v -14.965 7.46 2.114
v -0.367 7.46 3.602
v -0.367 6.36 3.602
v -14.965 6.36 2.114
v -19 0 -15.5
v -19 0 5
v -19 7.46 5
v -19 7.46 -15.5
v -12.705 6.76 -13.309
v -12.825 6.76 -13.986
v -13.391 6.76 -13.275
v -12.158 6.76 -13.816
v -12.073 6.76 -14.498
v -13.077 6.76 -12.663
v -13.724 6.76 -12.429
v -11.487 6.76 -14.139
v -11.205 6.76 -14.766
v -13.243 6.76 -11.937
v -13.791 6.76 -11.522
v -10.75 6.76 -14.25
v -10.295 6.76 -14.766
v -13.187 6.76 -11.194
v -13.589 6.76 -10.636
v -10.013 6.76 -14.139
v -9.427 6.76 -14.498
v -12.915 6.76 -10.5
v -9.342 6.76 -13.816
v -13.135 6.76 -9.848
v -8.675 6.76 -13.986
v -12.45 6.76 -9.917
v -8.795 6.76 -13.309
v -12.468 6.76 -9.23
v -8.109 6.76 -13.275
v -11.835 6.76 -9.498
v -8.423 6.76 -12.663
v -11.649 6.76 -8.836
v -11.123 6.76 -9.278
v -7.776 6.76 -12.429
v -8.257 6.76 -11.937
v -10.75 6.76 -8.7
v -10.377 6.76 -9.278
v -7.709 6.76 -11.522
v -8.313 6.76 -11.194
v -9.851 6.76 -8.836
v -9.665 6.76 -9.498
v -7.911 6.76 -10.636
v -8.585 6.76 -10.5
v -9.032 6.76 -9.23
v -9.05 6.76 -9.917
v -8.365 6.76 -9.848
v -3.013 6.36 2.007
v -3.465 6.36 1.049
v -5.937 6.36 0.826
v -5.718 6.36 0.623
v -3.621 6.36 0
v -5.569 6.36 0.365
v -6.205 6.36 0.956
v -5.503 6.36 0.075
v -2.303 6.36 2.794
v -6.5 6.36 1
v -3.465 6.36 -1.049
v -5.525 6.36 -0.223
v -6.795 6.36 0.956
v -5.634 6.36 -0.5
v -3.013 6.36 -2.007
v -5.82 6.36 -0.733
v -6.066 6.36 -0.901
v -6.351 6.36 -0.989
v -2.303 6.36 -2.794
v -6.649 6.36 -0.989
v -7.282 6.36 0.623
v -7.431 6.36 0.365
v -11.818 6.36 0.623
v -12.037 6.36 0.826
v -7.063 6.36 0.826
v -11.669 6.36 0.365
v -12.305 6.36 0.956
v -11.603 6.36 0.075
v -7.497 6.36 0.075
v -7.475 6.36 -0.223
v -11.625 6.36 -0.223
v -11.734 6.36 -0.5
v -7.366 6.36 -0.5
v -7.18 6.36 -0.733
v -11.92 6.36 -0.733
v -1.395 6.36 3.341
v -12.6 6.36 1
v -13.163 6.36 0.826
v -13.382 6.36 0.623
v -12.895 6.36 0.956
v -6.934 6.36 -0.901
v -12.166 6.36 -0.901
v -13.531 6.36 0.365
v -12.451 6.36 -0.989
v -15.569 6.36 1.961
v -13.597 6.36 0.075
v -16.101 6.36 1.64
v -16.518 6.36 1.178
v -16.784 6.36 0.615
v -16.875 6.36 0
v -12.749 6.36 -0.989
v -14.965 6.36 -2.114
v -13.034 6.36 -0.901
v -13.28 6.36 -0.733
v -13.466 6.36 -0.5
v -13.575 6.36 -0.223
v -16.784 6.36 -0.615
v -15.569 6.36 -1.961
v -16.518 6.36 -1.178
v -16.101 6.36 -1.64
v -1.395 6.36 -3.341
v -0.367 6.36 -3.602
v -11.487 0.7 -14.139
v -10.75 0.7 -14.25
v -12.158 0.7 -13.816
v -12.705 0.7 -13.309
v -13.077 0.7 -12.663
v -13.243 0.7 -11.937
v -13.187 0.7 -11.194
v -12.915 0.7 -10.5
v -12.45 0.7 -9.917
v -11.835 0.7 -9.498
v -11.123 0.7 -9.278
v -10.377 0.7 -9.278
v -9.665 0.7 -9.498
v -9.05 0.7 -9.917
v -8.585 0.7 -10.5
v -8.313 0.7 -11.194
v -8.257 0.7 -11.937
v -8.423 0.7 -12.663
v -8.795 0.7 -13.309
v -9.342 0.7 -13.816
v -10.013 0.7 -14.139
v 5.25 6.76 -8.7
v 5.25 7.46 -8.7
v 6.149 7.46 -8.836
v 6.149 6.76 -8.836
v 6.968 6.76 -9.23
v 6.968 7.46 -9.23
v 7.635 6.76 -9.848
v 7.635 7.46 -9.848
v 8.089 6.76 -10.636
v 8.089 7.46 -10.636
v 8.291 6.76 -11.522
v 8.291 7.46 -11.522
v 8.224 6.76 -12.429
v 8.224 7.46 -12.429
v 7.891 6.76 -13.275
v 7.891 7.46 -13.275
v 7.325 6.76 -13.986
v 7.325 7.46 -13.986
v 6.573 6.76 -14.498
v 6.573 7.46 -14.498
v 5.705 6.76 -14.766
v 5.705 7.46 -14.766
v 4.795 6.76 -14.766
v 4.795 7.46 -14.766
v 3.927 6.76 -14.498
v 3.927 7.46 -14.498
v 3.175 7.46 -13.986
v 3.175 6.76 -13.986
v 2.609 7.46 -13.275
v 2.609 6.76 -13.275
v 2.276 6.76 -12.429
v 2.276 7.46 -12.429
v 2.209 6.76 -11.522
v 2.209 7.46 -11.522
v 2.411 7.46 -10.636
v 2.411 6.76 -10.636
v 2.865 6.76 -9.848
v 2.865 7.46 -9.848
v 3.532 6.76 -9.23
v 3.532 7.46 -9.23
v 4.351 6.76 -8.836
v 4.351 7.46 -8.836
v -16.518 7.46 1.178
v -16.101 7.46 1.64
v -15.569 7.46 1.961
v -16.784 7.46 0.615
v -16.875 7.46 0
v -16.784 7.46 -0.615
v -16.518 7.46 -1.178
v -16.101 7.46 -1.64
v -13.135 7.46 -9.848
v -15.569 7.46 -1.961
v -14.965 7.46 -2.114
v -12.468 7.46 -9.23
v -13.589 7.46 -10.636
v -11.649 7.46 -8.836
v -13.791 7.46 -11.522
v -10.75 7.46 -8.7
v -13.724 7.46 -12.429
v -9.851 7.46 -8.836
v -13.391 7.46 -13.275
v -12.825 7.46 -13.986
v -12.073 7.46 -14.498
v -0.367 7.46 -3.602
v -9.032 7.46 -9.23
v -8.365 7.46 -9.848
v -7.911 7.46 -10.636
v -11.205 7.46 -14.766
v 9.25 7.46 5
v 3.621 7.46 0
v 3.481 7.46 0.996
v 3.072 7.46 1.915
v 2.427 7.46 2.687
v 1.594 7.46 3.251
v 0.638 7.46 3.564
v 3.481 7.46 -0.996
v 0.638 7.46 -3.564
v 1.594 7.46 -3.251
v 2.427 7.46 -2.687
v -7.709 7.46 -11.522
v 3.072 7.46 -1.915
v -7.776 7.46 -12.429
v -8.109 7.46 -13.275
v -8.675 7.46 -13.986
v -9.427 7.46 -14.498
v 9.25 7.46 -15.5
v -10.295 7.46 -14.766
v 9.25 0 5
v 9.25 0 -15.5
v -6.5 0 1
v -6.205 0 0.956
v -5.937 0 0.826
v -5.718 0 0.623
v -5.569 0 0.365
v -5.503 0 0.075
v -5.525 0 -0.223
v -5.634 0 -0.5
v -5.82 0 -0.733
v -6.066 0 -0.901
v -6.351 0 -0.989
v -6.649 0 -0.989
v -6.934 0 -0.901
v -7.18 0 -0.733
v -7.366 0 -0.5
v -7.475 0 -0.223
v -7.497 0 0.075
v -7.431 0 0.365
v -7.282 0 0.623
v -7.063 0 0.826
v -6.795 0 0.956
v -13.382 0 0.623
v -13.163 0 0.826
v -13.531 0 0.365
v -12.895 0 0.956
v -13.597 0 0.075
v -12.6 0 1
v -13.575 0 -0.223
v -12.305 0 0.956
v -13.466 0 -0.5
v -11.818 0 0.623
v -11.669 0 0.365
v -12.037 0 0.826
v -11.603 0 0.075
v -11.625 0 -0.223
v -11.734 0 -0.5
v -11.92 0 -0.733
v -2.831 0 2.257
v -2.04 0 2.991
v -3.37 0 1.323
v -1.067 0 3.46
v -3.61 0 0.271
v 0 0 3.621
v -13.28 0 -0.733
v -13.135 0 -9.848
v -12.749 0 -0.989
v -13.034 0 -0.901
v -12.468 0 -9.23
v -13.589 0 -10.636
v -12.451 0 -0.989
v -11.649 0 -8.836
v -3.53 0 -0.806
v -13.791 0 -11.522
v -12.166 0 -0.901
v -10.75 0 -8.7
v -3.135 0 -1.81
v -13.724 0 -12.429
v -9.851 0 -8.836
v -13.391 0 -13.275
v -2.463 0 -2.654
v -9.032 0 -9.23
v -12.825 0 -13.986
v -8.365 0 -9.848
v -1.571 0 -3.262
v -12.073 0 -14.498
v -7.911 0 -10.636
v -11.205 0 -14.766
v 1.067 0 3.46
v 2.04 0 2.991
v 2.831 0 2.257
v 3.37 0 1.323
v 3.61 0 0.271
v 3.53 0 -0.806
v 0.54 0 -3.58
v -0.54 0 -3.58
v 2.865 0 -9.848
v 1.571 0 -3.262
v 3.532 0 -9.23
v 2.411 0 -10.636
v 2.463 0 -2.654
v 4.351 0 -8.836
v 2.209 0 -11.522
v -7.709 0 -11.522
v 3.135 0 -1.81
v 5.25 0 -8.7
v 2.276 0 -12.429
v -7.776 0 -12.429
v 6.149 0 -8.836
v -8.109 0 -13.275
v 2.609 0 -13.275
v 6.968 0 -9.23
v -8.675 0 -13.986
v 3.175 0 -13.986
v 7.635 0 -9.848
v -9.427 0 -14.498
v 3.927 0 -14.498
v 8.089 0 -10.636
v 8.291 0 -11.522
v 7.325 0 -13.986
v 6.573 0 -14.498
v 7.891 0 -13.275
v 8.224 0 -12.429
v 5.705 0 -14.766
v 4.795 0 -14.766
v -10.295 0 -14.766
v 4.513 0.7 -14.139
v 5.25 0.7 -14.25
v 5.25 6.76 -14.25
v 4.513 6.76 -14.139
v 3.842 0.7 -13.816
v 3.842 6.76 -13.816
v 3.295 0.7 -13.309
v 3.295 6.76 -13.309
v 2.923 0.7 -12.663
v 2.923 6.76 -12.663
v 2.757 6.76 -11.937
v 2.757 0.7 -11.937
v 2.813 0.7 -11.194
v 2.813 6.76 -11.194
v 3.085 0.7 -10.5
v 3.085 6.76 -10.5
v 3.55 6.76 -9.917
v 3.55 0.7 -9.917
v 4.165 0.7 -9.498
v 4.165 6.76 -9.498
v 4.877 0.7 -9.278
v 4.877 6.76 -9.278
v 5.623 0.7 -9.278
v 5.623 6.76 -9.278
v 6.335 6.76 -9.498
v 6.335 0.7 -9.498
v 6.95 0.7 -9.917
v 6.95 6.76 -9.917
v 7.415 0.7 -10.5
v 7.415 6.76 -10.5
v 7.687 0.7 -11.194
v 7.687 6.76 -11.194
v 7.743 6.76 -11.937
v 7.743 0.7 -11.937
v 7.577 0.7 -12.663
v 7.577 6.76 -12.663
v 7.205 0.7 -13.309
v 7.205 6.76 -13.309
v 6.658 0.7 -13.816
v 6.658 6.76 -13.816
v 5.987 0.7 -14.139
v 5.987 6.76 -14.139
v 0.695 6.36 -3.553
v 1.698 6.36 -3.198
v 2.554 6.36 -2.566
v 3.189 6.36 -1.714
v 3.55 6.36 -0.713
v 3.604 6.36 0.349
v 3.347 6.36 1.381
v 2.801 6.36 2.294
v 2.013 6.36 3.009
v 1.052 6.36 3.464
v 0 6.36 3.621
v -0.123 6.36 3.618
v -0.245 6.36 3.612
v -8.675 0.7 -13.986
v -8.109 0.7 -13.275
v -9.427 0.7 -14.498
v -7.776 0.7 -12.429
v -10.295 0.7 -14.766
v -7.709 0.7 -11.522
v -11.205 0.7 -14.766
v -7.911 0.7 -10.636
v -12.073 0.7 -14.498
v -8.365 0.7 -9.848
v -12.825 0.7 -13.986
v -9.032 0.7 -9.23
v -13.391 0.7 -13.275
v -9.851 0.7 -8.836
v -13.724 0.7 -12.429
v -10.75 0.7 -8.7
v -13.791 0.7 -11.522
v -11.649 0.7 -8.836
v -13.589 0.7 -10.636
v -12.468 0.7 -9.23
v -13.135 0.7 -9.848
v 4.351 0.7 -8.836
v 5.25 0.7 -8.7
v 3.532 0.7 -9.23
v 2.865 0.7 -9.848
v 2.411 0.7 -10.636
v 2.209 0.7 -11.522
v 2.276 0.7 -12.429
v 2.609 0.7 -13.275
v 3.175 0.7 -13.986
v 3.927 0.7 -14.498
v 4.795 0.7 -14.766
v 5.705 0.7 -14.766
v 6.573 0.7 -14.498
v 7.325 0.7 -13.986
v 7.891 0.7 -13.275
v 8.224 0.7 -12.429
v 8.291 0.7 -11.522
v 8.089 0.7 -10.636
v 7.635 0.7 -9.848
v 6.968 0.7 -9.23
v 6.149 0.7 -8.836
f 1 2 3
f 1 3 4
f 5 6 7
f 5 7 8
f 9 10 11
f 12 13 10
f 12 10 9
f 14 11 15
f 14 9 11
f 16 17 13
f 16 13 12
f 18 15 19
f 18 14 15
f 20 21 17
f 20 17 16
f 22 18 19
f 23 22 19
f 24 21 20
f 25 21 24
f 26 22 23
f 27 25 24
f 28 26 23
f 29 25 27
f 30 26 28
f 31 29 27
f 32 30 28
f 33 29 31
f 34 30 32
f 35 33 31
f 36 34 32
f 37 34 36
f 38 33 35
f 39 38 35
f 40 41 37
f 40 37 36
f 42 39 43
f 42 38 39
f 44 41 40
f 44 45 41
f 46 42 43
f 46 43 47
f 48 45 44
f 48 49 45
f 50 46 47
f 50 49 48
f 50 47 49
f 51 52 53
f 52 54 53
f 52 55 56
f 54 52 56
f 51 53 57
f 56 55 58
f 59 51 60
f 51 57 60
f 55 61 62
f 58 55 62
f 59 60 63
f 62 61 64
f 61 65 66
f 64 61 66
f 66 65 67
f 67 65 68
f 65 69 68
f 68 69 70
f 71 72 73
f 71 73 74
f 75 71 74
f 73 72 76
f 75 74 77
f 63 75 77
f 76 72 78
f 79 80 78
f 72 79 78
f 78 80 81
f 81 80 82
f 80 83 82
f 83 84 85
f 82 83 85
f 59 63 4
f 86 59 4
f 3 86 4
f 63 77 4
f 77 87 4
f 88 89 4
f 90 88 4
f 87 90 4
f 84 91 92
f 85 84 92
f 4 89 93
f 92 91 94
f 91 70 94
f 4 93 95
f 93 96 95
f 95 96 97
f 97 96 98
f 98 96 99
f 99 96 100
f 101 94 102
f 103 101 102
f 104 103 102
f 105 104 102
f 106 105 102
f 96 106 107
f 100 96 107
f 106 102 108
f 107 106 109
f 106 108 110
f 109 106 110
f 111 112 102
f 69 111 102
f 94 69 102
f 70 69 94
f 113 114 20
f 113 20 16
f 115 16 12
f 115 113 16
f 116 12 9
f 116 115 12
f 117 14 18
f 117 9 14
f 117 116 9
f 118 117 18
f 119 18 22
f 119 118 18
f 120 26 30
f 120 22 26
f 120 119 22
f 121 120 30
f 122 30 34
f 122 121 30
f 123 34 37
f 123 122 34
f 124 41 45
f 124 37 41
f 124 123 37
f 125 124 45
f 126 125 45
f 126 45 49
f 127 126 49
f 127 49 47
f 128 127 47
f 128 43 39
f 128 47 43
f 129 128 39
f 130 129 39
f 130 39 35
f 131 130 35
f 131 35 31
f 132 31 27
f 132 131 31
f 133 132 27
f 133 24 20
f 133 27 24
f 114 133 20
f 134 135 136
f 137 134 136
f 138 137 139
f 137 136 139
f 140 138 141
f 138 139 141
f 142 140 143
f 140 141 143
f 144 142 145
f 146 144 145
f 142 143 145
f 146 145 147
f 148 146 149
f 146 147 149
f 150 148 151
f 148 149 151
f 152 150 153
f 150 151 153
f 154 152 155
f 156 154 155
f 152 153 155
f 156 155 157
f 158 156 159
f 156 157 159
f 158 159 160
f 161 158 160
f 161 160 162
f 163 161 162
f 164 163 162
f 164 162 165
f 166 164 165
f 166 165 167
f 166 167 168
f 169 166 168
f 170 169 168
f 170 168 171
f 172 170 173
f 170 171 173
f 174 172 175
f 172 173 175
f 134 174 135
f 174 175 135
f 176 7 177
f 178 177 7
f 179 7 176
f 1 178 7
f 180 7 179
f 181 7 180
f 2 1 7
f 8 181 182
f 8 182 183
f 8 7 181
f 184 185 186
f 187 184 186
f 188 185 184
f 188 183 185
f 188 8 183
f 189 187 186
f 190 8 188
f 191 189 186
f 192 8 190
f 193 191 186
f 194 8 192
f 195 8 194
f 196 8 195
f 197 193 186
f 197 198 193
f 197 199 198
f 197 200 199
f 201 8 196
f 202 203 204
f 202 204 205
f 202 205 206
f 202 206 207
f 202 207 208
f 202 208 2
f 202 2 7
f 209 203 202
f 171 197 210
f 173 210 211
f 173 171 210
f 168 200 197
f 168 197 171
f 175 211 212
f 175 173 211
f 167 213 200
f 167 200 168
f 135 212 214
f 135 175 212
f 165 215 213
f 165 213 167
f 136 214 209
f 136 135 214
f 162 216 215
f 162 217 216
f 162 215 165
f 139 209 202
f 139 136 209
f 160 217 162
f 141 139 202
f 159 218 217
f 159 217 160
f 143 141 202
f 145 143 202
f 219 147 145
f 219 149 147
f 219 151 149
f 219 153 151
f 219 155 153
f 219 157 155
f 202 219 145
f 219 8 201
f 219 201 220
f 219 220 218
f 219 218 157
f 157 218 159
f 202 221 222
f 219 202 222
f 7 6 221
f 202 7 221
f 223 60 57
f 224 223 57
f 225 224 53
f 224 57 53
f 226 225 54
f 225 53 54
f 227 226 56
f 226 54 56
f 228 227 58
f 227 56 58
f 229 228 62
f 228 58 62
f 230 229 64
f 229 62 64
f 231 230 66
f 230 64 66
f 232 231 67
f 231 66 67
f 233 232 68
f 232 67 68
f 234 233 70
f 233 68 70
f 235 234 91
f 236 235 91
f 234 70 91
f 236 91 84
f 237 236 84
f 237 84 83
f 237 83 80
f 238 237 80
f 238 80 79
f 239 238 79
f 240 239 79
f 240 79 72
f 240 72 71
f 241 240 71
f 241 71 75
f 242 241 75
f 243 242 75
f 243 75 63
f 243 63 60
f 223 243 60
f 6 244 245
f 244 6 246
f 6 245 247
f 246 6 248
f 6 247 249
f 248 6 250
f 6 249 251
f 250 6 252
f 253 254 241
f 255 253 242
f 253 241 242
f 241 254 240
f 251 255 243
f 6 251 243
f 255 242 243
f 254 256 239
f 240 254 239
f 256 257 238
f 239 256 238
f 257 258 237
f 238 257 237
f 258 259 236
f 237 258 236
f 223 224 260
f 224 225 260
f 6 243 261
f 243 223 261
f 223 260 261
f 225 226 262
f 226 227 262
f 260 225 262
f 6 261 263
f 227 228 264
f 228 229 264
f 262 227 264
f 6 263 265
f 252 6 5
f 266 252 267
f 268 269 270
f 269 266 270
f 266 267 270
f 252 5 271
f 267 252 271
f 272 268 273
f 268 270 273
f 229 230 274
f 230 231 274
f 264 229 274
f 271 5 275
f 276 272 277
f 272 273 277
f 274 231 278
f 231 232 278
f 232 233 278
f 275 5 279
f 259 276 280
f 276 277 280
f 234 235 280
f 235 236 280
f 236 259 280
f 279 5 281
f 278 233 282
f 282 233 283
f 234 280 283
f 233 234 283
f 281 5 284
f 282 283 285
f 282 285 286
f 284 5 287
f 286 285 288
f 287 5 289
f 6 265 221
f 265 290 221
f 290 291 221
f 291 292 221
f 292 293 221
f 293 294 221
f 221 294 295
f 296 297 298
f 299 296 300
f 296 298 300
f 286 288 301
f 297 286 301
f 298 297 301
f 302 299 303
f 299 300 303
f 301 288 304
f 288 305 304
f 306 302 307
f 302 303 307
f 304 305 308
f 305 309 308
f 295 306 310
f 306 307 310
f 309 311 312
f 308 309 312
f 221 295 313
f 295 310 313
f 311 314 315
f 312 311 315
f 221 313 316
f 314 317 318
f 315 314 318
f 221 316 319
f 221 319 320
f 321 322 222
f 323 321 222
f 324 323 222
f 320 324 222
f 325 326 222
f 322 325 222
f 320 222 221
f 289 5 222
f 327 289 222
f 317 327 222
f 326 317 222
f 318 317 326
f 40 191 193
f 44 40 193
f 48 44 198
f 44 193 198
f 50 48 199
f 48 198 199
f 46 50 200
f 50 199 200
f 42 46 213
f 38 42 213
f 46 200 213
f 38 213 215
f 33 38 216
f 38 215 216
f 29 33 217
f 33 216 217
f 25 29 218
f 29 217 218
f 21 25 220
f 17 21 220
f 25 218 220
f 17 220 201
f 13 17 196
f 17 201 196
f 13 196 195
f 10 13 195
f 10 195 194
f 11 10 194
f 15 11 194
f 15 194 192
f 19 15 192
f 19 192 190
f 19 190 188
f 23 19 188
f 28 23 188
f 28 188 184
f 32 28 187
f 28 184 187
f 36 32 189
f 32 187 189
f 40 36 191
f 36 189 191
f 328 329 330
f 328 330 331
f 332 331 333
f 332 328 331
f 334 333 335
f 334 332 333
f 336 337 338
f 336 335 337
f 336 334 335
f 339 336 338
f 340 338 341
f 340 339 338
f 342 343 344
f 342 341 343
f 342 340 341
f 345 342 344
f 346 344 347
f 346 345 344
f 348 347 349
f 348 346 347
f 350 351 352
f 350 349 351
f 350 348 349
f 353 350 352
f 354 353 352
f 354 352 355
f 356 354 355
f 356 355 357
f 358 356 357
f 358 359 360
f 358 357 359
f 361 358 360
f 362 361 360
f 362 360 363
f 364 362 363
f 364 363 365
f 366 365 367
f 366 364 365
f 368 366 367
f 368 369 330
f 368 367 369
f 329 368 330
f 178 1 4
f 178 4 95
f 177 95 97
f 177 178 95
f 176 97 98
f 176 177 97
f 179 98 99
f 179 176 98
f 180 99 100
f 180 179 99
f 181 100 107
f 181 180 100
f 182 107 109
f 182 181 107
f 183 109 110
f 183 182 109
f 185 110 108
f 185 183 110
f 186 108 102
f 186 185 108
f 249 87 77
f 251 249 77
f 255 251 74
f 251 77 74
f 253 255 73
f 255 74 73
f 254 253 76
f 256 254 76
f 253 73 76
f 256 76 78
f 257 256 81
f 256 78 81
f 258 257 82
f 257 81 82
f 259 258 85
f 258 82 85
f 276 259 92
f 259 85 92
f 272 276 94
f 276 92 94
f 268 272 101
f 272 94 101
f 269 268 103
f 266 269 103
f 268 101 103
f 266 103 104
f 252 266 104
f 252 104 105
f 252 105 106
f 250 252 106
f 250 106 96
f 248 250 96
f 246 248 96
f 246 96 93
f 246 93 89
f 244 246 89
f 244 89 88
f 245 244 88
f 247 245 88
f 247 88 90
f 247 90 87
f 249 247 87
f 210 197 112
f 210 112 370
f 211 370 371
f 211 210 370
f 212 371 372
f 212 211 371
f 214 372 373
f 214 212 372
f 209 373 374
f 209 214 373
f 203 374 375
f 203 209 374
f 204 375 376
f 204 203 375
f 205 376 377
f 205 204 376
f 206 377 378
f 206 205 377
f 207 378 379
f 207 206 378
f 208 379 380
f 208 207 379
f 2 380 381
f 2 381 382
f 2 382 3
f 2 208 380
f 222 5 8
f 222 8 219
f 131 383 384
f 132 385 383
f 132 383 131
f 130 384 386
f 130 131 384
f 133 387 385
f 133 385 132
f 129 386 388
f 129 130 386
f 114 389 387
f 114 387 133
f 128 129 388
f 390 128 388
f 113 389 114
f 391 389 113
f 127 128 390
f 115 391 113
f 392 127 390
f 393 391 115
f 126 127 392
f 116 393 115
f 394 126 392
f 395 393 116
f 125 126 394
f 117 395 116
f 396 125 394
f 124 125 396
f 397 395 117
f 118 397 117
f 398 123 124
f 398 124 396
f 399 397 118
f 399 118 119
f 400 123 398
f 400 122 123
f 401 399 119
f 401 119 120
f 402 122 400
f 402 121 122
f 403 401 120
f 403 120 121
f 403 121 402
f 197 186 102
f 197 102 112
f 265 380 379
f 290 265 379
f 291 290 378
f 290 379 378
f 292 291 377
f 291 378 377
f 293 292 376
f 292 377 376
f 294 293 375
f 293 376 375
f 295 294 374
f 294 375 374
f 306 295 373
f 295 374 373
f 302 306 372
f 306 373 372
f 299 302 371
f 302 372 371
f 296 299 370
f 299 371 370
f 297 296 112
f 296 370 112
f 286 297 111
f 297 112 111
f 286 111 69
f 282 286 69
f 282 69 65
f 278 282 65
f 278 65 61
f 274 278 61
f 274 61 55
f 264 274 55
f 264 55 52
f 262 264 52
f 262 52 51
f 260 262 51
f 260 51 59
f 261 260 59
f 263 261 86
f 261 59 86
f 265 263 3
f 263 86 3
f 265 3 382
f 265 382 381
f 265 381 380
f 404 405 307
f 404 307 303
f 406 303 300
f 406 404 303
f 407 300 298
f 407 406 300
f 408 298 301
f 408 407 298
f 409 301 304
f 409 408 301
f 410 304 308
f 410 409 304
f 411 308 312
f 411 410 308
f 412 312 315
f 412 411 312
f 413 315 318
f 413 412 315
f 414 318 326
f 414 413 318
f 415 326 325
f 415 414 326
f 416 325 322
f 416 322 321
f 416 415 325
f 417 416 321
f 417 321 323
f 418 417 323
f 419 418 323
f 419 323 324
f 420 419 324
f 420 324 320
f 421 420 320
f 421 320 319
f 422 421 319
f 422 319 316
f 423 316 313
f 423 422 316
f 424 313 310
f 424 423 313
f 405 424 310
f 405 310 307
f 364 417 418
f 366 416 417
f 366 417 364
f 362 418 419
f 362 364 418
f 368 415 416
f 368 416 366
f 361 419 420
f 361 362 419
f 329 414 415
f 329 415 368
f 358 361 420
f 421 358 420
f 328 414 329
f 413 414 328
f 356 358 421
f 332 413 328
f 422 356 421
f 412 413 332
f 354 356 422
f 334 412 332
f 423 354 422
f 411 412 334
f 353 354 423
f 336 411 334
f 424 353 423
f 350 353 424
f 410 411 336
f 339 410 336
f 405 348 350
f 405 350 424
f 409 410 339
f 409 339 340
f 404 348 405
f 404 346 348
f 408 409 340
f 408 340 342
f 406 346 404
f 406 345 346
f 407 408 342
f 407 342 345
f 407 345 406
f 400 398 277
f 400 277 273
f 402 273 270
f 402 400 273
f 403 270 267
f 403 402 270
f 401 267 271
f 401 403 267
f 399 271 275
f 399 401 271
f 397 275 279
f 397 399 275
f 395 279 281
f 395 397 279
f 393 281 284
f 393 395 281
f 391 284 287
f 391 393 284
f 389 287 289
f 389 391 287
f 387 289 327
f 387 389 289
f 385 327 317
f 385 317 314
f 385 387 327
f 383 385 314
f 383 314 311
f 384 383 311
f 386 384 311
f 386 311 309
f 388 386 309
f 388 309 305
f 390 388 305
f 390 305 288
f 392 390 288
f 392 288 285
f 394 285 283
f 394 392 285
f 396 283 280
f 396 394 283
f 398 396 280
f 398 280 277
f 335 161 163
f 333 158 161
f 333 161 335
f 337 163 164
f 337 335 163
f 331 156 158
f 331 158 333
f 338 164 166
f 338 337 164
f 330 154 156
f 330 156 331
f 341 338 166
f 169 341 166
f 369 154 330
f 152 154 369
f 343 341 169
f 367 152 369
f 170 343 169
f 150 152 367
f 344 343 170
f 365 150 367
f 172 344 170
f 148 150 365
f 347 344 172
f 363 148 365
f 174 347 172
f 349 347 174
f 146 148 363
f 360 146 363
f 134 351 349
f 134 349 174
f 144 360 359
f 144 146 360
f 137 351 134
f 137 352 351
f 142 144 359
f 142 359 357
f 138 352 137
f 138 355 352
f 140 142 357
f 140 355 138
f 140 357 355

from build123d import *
from build123d.topology import SkipClean

# Parameters (mm, degrees)
SKETCH1_W           = 28.25
SKETCH1_H           = 20.5
SKETCH1_R           = 2.5
BOSS_EXTRUDE1_DEPTH = 7.46
CUT_EXTRUDE2_DEPTH  = 1.1
SKETCH5_R           = 1
SKETCH5_R_2         = 3.62054265
CUT_EXTRUDE3_DEPTH  = 26.331790304
SKETCH6_R           = 3.05
CUT_EXTRUDE4_DEPTH  = 0.7
CUT_EXTRUDE5_START  = -0.7
SKETCH7_R           = 3.05
CUT_EXTRUDE5_DEPTH  = 0.7


with BuildPart() as part:
    # Sketch1 → Boss-Extrude1 (new body)
    with BuildSketch(Plane(origin=(0, 0, 0), x_dir=(1, 0, 0), z_dir=(0, 1, 0))):
        with Locations((-4.875, 5.25)):
            Rectangle(SKETCH1_W, SKETCH1_H)
        with Locations(Location((5.25, 11.75, 0), (0, 0, 90))):
            Circle(SKETCH1_R, mode=Mode.SUBTRACT)
        with Locations(Location((-10.75, 11.75, 0), (0, 0, 90))):
            Circle(SKETCH1_R, mode=Mode.SUBTRACT)
    extrude(amount=BOSS_EXTRUDE1_DEPTH)

    # Sketch3 → Cut-Extrude2 (cut)
    with BuildSketch(Plane(origin=(0, 7.46, 0), x_dir=(1, 0, 0), z_dir=(0, 1, 0))):
        with BuildLine():
            Line((-14.965459534, 2.114048767), (-0.367096675, 3.601884106))
            ThreePointArc((-0.367096675, 3.601884106), (3.62054265, 0), (-0.367096675, -3.601884106))
            Line((-0.367096675, -3.601884106), (-14.965459534, -2.114048767))
            ThreePointArc((-14.965459534, -2.114048767), (-16.875, 0), (-14.965459534, 2.114048767))
        make_face()
    extrude(amount=-CUT_EXTRUDE2_DEPTH, mode=Mode.SUBTRACT)

    # Sketch5 → Cut-Extrude3 (cut, through all)
    with SkipClean():  # the faces are left unmerged after this step: merging them gives an invalid solid
        with BuildSketch(Plane(origin=(0, 6.36, 0), x_dir=(1, 0, 0), z_dir=(0, 1, 0))):
            with Locations(Location((-12.6, 0, 0), (0, 0, 270))):
                Circle(SKETCH5_R)
            with Locations(Location((-6.5, 0, 0), (0, 0, 270))):
                Circle(SKETCH5_R)
            with Locations(Location((0, 0, 0), (0, 0, 270))):
                Circle(SKETCH5_R_2)
        extrude(amount=-CUT_EXTRUDE3_DEPTH, mode=Mode.SUBTRACT)

    # Sketch6 → Cut-Extrude4 (cut)
    with SkipClean():  # the faces are left unmerged after this step: merging them gives an invalid solid
        with BuildSketch(Plane(origin=(0, 7.46, 0), x_dir=(1, 0, 0), z_dir=(0, 1, 0))):
            with Locations(Location((-10.75, 11.75, 0), (0, 0, 270))):
                Circle(SKETCH6_R)
            with Locations(Location((5.25, 11.75, 0), (0, 0, 270))):
                Circle(SKETCH6_R)
        extrude(amount=-CUT_EXTRUDE4_DEPTH, mode=Mode.SUBTRACT)

    # Sketch7 → Cut-Extrude5 (cut)
    with SkipClean():  # the faces are left unmerged after this step: merging them gives an invalid solid
        with BuildSketch(Plane.XZ.offset(CUT_EXTRUDE5_START)):
            with Locations(Location((5.25, -11.75, 0), (0, 0, 90))):
                Circle(SKETCH7_R)
            with Locations(Location((-10.75, -11.75, 0), (0, 0, 90))):
                Circle(SKETCH7_R)
        extrude(amount=CUT_EXTRUDE5_DEPTH, mode=Mode.SUBTRACT)


solid = part.part
